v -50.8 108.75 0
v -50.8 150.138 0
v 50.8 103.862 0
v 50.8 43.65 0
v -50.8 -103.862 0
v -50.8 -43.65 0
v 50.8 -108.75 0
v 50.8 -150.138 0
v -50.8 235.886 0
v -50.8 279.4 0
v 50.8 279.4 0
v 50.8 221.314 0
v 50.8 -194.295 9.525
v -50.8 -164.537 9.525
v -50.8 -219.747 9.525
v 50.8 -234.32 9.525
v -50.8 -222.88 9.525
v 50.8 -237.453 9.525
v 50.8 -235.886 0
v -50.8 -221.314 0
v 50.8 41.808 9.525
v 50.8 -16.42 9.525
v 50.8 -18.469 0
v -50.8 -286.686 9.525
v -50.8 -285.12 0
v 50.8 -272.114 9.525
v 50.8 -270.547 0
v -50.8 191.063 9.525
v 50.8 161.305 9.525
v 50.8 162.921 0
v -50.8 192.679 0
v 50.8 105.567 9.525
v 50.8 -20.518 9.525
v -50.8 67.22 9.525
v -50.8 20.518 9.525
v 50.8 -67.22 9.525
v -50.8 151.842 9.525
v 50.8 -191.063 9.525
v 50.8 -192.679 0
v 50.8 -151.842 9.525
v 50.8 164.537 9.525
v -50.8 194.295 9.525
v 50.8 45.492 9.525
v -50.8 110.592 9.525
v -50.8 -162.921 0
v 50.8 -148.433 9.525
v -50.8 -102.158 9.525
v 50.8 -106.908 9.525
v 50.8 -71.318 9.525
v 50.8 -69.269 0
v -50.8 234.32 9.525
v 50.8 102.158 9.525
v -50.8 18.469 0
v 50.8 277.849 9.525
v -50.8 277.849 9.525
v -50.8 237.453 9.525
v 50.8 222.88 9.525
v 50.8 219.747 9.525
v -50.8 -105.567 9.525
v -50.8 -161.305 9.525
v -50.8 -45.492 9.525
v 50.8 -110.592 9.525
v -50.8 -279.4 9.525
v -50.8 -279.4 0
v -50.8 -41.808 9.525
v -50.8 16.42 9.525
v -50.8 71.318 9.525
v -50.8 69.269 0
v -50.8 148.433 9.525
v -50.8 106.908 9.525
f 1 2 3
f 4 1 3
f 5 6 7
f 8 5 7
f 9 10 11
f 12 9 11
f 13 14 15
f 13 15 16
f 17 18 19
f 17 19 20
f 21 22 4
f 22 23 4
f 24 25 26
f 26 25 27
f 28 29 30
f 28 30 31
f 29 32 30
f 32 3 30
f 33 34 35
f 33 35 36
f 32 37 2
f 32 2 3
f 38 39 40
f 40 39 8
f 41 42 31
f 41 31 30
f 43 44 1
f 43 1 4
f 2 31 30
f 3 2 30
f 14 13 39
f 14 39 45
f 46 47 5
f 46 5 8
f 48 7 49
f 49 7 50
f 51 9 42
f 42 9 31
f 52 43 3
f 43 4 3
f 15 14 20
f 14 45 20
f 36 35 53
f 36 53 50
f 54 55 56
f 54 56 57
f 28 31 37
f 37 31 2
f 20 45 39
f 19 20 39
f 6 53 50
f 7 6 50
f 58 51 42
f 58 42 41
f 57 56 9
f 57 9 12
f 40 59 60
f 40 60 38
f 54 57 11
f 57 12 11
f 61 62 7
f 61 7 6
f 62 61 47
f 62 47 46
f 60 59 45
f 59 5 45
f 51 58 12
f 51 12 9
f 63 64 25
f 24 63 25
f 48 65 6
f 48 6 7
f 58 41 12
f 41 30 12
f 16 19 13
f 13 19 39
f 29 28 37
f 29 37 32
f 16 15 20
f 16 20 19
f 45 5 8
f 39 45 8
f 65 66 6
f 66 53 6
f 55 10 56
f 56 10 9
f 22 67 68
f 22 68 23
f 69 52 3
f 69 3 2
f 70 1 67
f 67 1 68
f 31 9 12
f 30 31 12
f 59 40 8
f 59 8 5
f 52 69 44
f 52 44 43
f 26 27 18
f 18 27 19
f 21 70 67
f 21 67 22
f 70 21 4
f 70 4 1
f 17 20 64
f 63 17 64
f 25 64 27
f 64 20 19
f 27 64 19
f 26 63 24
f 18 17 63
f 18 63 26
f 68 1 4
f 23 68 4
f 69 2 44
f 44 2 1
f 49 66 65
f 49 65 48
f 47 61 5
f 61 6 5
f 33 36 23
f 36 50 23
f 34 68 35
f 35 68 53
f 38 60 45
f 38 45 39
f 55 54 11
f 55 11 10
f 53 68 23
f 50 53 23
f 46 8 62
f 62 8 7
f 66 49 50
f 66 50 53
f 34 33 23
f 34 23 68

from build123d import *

# Parameters (mm, degrees)
F2_DEPTH    = 9.525
F3_DEPTH    = 9.525
F4_DEPTH    = 9.525
F5_DEPTH    = 9.525
F6_DEPTH    = 9.525
F7_DEPTH    = 9.525
F8_DEPTH    = 9.525
F9_DEPTH    = 9.525
F10_DEPTH   = 9.525
F11_DEPTH   = 9.525
F12_DEPTH   = 9.525
F13_SIZE2   = 1.550911
F13_SIZE    = 9.52499
F13_2_SIZE2 = 1.550911
F13_2_SIZE  = 9.52499
F14_SIZE2   = 1.550911
F14_SIZE    = 9.52499
F14_2_SIZE2 = 1.550911
F14_2_SIZE  = 9.52499
F15_SIZE2   = 1.550911
F15_SIZE    = 9.52499
F15_2_SIZE2 = 1.550911
F15_2_SIZE  = 9.52499
F16_SIZE2   = 1.550911
F16_SIZE    = 9.52499
F16_2_SIZE2 = 1.550911
F16_2_SIZE  = 9.52499
F17_SIZE2   = 1.550911
F17_SIZE    = 9.52499
F17_2_SIZE2 = 1.550911
F17_2_SIZE  = 9.52499
F18_SIZE2   = 1.550911
F18_SIZE    = 9.52499
F18_2_SIZE2 = 1.550911
F18_2_SIZE  = 9.52499
F19_SIZE2   = 1.550911
F19_SIZE    = 9.52499
F19_2_SIZE2 = 1.550911
F19_2_SIZE  = 9.52499
F20_SIZE2   = 1.550911
F20_SIZE    = 9.52499
F20_2_SIZE2 = 1.550911
F20_2_SIZE  = 9.52499
F21_SIZE2   = 1.550911
F21_SIZE    = 9.52499
F21_2_SIZE2 = 1.550911
F21_2_SIZE  = 9.52499
F22_SIZE2   = 1.550911
F22_SIZE    = 9.52499
F22_2_SIZE2 = 1.550911
F22_2_SIZE  = 9.52499
F23_SIZE2   = 1.550911
F23_SIZE    = 9.52499
F24_SIZE2   = 1.550911
F24_SIZE    = 9.52499


# Not quite as in the source:
# - a fillet or chamfer is up to 0.001 mm smaller than in the source, because OpenCascade refuses the exact size


with BuildPart() as f2:
    # F1 (on Top) → F2 (new body)
    with BuildSketch(Plane.XY):
        Polygon((50.8, 279.4), (-50.8, 279.4), (-50.8, 235.8864560812), (50.8, 221.3135439188), align=None)
    extrude(amount=F2_DEPTH)

    # F13 (size 9.525 and 1.5509205186 in the source; OpenCascade refuses exactly that, so slightly less here)
    f13_edges = [f2.edges().sort_by_distance(p)[0] for p in [
        (0, 228.6, 9.525),
    ]]
    f13_side = f2.faces().sort_by_distance((0, 228.6, 4.7625))[0]
    chamfer(f13_edges, length=F13_SIZE, length2=F13_SIZE2, reference=f13_side)

    # F13#2 (size 9.525 and 1.5509205186 in the source; OpenCascade refuses exactly that, so slightly less here)
    f13_2_edges = [f2.edges().sort_by_distance(p)[0] for p in [
        (0, 279.4, 9.525),
    ]]
    f13_2_side = f2.faces().sort_by_distance((0, 279.4, 4.7625))[0]
    chamfer(f13_2_edges, length=F13_2_SIZE, length2=F13_2_SIZE2, reference=f13_2_side)


with BuildPart() as f3:
    # F1 (on Top) → F3 (new body)
    with BuildSketch(Plane.XY):
        Polygon((50.8, 221.3135439188), (-50.8, 235.8864560812), (-50.8, 192.6790237109), (50.8, 162.9209762891), align=None)
    extrude(amount=F3_DEPTH)

    # F14 (size 9.525 and 1.5509205186 in the source; OpenCascade refuses exactly that, so slightly less here)
    f14_edges = [f3.edges().sort_by_distance(p)[0] for p in [
        (0, 228.6, 9.525),
    ]]
    f14_side = f3.faces().sort_by_distance((0, 228.6, 4.7625))[0]
    chamfer(f14_edges, length=F14_SIZE, length2=F14_SIZE2, reference=f14_side)

    # F14#2 (size 9.525 and 1.5509205186 in the source; OpenCascade refuses exactly that, so slightly less here)
    f14_2_edges = [f3.edges().sort_by_distance(p)[0] for p in [
        (0, 177.8, 9.525),
    ]]
    f14_2_side = f3.faces().sort_by_distance((0, 177.8, 4.7625))[0]
    chamfer(f14_2_edges, length=F14_2_SIZE, length2=F14_2_SIZE2, reference=f14_2_side)


with BuildPart() as f4:
    # F1 (on Top) → F4 (new body)
    with BuildSketch(Plane.XY):
        Polygon((50.8, 162.9209762891), (-50.8, 192.6790237109), (-50.8, 150.1375105152), (50.8, 103.8624894848), align=None)
    extrude(amount=F4_DEPTH)

    # F15 (size 9.525 and 1.5509205186 in the source; OpenCascade refuses exactly that, so slightly less here)
    f15_edges = [f4.edges().sort_by_distance(p)[0] for p in [
        (0, 177.8, 9.525),
    ]]
    f15_side = f4.faces().sort_by_distance((0, 177.8, 4.7625))[0]
    chamfer(f15_edges, length=F15_SIZE, length2=F15_SIZE2, reference=f15_side)

    # F15#2 (size 9.525 and 1.5509205186 in the source; OpenCascade refuses exactly that, so slightly less here)
    f15_2_edges = [f4.edges().sort_by_distance(p)[0] for p in [
        (0, 127, 9.525),
    ]]
    f15_2_side = f4.faces().sort_by_distance((0, 127, 4.7625))[0]
    chamfer(f15_2_edges, length=F15_2_SIZE, length2=F15_2_SIZE2, reference=f15_2_side)


with BuildPart() as f5:
    # F1 (on Top) → F5 (new body)
    with BuildSketch(Plane.XY):
        Polygon((50.8, 103.8624894848), (-50.8, 150.1375105152), (-50.8, 108.75045291), (50.8, 43.64954709), align=None)
    extrude(amount=F5_DEPTH)

    # F16 (size 9.525 and 1.5509205186 in the source; OpenCascade refuses exactly that, so slightly less here)
    f16_edges = [f5.edges().sort_by_distance(p)[0] for p in [
        (0, 127, 9.525),
    ]]
    f16_side = f5.faces().sort_by_distance((0, 127, 4.7625))[0]
    chamfer(f16_edges, length=F16_SIZE, length2=F16_SIZE2, reference=f16_side)

    # F16#2 (size 9.525 and 1.5509205186 in the source; OpenCascade refuses exactly that, so slightly less here)
    f16_2_edges = [f5.edges().sort_by_distance(p)[0] for p in [
        (0, 76.2, 9.525),
    ]]
    f16_2_side = f5.faces().sort_by_distance((0, 76.2, 4.7625))[0]
    chamfer(f16_2_edges, length=F16_2_SIZE, length2=F16_2_SIZE2, reference=f16_2_side)


with BuildPart() as f6:
    # F1 (on Top) → F6 (new body)
    with BuildSketch(Plane.XY):
        Polygon((50.8, 43.64954709), (-50.8, 108.75045291), (-50.8, 69.2687277608), (50.8, -18.4687277608), align=None)
    extrude(amount=F6_DEPTH)

    # F17 (size 9.525 and 1.5509205186 in the source; OpenCascade refuses exactly that, so slightly less here)
    f17_edges = [f6.edges().sort_by_distance(p)[0] for p in [
        (0, 25.4, 9.525),
    ]]
    f17_side = f6.faces().sort_by_distance((0, 25.4, 4.7625))[0]
    chamfer(f17_edges, length=F17_SIZE, length2=F17_SIZE2, reference=f17_side)

    # F17#2 (size 9.525 and 1.5509205186 in the source; OpenCascade refuses exactly that, so slightly less here)
    f17_2_edges = [f6.edges().sort_by_distance(p)[0] for p in [
        (0, 76.2, 9.525),
    ]]
    f17_2_side = f6.faces().sort_by_distance((0, 76.2, 4.7625))[0]
    chamfer(f17_2_edges, length=F17_2_SIZE, length2=F17_2_SIZE2, reference=f17_2_side)


with BuildPart() as f7:
    # F1 (on Top) → F7 (new body)
    with BuildSketch(Plane.XY):
        Polygon((50.8, -18.4687277608), (-50.8, 69.2687277608), (-50.8, 18.4687277609), (50.7999999999, -69.2687277608), align=None)
    extrude(amount=F7_DEPTH)

    # F18 (size 9.525 and 1.5509205186 in the source; OpenCascade refuses exactly that, so slightly less here)
    f18_edges = [f7.edges().sort_by_distance(p)[0] for p in [
        (0, 25.4, 9.525),
    ]]
    f18_side = f7.faces().sort_by_distance((0, 25.4, 4.7625))[0]
    chamfer(f18_edges, length=F18_SIZE, length2=F18_SIZE2, reference=f18_side)

    # F18#2 (size 9.525 and 1.5509205186 in the source; OpenCascade refuses exactly that, so slightly less here)
    f18_2_edges = [f7.edges().sort_by_distance(p)[0] for p in [
        (0, -25.4, 9.525),
    ]]
    f18_2_side = f7.faces().sort_by_distance((0, -25.4, 4.7625))[0]
    chamfer(f18_2_edges, length=F18_2_SIZE, length2=F18_2_SIZE2, reference=f18_2_side)


with BuildPart() as f8:
    # F1 (on Top) → F8 (new body)
    with BuildSketch(Plane.XY):
        Polygon((50.7999999999, -69.2687277608), (-50.8000000001, 18.4687277609), (-50.8, -43.64954709), (50.7999999999, -108.7504529099), align=None)
    extrude(amount=F8_DEPTH)

    # F19 (size 9.525 and 1.5509205186 in the source; OpenCascade refuses exactly that, so slightly less here)
    f19_edges = [f8.edges().sort_by_distance(p)[0] for p in [
        (0, -25.4, 9.525),
    ]]
    f19_side = f8.faces().sort_by_distance((0, -25.4, 4.7625))[0]
    chamfer(f19_edges, length=F19_SIZE, length2=F19_SIZE2, reference=f19_side)

    # F19#2 (size 9.525 and 1.5509205186 in the source; OpenCascade refuses exactly that, so slightly less here)
    f19_2_edges = [f8.edges().sort_by_distance(p)[0] for p in [
        (0, -76.2, 9.525),
    ]]
    f19_2_side = f8.faces().sort_by_distance((0, -76.2, 4.7625))[0]
    chamfer(f19_2_edges, length=F19_2_SIZE, length2=F19_2_SIZE2, reference=f19_2_side)


with BuildPart() as f9:
    # F1 (on Top) → F9 (new body)
    with BuildSketch(Plane.XY):
        Polygon((50.7999999999, -108.7504529099), (-50.8000000001, -43.64954709), (-50.8, -103.8624894848), (50.7999999999, -150.1375105152), align=None)
    extrude(amount=F9_DEPTH)

    # F20 (size 9.525 and 1.5509205186 in the source; OpenCascade refuses exactly that, so slightly less here)
    f20_edges = [f9.edges().sort_by_distance(p)[0] for p in [
        (0, -76.2, 9.525),
    ]]
    f20_side = f9.faces().sort_by_distance((0, -76.2, 4.7625))[0]
    chamfer(f20_edges, length=F20_SIZE, length2=F20_SIZE2, reference=f20_side)

    # F20#2 (size 9.525 and 1.5509205186 in the source; OpenCascade refuses exactly that, so slightly less here)
    f20_2_edges = [f9.edges().sort_by_distance(p)[0] for p in [
        (0, -127, 9.525),
    ]]
    f20_2_side = f9.faces().sort_by_distance((0, -127, 4.7625))[0]
    chamfer(f20_2_edges, length=F20_2_SIZE, length2=F20_2_SIZE2, reference=f20_2_side)


with BuildPart() as f10:
    # F1 (on Top) → F10 (new body)
    with BuildSketch(Plane.XY):
        Polygon((50.7999999999, -150.1375105152), (-50.8000000001, -103.8624894848), (-50.8, -162.9209762891), (50.7999999999, -192.6790237109), align=None)
    extrude(amount=F10_DEPTH)

    # F21 (size 9.525 and 1.5509205186 in the source; OpenCascade refuses exactly that, so slightly less here)
    f21_edges = [f10.edges().sort_by_distance(p)[0] for p in [
        (0, -127, 9.525),
    ]]
    f21_side = f10.faces().sort_by_distance((0, -127, 4.7625))[0]
    chamfer(f21_edges, length=F21_SIZE, length2=F21_SIZE2, reference=f21_side)

    # F21#2 (size 9.525 and 1.5509205186 in the source; OpenCascade refuses exactly that, so slightly less here)
    f21_2_edges = [f10.edges().sort_by_distance(p)[0] for p in [
        (0, -177.8, 9.525),
    ]]
    f21_2_side = f10.faces().sort_by_distance((0, -177.8, 4.7625))[0]
    chamfer(f21_2_edges, length=F21_2_SIZE, length2=F21_2_SIZE2, reference=f21_2_side)


with BuildPart() as f11:
    # F1 (on Top) → F11 (new body)
    with BuildSketch(Plane.XY):
        Polygon((50.7999999999, -192.6790237109), (-50.8000000001, -162.9209762891), (-50.8, -221.3135439188), (50.7999999999, -235.8864560811), align=None)
    extrude(amount=F11_DEPTH)

    # F22 (size 9.525 and 1.5509205186 in the source; OpenCascade refuses exactly that, so slightly less here)
    f22_edges = [f11.edges().sort_by_distance(p)[0] for p in [
        (0, -177.8, 9.525),
    ]]
    f22_side = f11.faces().sort_by_distance((0, -177.8, 4.7625))[0]
    chamfer(f22_edges, length=F22_SIZE, length2=F22_SIZE2, reference=f22_side)

    # F22#2 (size 9.525 and 1.5509205186 in the source; OpenCascade refuses exactly that, so slightly less here)
    f22_2_edges = [f11.edges().sort_by_distance(p)[0] for p in [
        (0, -228.6, 9.525),
    ]]
    f22_2_side = f11.faces().sort_by_distance((0, -228.6, 4.7625))[0]
    chamfer(f22_2_edges, length=F22_2_SIZE, length2=F22_2_SIZE2, reference=f22_2_side)


with BuildPart() as f12:
    # F1 (on Top) → F12 (new body)
    with BuildSketch(Plane.XY):
        Polygon((50.7999999999, -235.8864560811), (-50.8000000001, -221.3135439188), (-50.8, -279.4), (-50.8, -286.6864560812), (50.8, -272.1135439188), align=None)
    extrude(amount=F12_DEPTH)

    # F23 (size 9.525 and 1.5509205186 in the source; OpenCascade refuses exactly that, so slightly less here)
    f23_edges = [f12.edges().sort_by_distance(p)[0] for p in [
        (0, -228.6, 9.525),
    ]]
    f23_side = f12.faces().sort_by_distance((0, -228.6, 4.7625))[0]
    chamfer(f23_edges, length=F23_SIZE, length2=F23_SIZE2, reference=f23_side)

    # F24 (size 9.525 and 1.5509205186 in the source; OpenCascade refuses exactly that, so slightly less here)
    f24_edges = [f12.edges().sort_by_distance(p)[0] for p in [
        (0, -279.4, 0),
    ]]
    f24_side = f12.faces().sort_by_distance((0, -279.4, 4.7625))[0]
    chamfer(f24_edges, length=F24_SIZE, length2=F24_SIZE2, reference=f24_side)


solid = Compound([f2.part, f3.part, f4.part, f5.part, f6.part, f7.part, f8.part, f9.part, f10.part, f11.part, f12.part])
